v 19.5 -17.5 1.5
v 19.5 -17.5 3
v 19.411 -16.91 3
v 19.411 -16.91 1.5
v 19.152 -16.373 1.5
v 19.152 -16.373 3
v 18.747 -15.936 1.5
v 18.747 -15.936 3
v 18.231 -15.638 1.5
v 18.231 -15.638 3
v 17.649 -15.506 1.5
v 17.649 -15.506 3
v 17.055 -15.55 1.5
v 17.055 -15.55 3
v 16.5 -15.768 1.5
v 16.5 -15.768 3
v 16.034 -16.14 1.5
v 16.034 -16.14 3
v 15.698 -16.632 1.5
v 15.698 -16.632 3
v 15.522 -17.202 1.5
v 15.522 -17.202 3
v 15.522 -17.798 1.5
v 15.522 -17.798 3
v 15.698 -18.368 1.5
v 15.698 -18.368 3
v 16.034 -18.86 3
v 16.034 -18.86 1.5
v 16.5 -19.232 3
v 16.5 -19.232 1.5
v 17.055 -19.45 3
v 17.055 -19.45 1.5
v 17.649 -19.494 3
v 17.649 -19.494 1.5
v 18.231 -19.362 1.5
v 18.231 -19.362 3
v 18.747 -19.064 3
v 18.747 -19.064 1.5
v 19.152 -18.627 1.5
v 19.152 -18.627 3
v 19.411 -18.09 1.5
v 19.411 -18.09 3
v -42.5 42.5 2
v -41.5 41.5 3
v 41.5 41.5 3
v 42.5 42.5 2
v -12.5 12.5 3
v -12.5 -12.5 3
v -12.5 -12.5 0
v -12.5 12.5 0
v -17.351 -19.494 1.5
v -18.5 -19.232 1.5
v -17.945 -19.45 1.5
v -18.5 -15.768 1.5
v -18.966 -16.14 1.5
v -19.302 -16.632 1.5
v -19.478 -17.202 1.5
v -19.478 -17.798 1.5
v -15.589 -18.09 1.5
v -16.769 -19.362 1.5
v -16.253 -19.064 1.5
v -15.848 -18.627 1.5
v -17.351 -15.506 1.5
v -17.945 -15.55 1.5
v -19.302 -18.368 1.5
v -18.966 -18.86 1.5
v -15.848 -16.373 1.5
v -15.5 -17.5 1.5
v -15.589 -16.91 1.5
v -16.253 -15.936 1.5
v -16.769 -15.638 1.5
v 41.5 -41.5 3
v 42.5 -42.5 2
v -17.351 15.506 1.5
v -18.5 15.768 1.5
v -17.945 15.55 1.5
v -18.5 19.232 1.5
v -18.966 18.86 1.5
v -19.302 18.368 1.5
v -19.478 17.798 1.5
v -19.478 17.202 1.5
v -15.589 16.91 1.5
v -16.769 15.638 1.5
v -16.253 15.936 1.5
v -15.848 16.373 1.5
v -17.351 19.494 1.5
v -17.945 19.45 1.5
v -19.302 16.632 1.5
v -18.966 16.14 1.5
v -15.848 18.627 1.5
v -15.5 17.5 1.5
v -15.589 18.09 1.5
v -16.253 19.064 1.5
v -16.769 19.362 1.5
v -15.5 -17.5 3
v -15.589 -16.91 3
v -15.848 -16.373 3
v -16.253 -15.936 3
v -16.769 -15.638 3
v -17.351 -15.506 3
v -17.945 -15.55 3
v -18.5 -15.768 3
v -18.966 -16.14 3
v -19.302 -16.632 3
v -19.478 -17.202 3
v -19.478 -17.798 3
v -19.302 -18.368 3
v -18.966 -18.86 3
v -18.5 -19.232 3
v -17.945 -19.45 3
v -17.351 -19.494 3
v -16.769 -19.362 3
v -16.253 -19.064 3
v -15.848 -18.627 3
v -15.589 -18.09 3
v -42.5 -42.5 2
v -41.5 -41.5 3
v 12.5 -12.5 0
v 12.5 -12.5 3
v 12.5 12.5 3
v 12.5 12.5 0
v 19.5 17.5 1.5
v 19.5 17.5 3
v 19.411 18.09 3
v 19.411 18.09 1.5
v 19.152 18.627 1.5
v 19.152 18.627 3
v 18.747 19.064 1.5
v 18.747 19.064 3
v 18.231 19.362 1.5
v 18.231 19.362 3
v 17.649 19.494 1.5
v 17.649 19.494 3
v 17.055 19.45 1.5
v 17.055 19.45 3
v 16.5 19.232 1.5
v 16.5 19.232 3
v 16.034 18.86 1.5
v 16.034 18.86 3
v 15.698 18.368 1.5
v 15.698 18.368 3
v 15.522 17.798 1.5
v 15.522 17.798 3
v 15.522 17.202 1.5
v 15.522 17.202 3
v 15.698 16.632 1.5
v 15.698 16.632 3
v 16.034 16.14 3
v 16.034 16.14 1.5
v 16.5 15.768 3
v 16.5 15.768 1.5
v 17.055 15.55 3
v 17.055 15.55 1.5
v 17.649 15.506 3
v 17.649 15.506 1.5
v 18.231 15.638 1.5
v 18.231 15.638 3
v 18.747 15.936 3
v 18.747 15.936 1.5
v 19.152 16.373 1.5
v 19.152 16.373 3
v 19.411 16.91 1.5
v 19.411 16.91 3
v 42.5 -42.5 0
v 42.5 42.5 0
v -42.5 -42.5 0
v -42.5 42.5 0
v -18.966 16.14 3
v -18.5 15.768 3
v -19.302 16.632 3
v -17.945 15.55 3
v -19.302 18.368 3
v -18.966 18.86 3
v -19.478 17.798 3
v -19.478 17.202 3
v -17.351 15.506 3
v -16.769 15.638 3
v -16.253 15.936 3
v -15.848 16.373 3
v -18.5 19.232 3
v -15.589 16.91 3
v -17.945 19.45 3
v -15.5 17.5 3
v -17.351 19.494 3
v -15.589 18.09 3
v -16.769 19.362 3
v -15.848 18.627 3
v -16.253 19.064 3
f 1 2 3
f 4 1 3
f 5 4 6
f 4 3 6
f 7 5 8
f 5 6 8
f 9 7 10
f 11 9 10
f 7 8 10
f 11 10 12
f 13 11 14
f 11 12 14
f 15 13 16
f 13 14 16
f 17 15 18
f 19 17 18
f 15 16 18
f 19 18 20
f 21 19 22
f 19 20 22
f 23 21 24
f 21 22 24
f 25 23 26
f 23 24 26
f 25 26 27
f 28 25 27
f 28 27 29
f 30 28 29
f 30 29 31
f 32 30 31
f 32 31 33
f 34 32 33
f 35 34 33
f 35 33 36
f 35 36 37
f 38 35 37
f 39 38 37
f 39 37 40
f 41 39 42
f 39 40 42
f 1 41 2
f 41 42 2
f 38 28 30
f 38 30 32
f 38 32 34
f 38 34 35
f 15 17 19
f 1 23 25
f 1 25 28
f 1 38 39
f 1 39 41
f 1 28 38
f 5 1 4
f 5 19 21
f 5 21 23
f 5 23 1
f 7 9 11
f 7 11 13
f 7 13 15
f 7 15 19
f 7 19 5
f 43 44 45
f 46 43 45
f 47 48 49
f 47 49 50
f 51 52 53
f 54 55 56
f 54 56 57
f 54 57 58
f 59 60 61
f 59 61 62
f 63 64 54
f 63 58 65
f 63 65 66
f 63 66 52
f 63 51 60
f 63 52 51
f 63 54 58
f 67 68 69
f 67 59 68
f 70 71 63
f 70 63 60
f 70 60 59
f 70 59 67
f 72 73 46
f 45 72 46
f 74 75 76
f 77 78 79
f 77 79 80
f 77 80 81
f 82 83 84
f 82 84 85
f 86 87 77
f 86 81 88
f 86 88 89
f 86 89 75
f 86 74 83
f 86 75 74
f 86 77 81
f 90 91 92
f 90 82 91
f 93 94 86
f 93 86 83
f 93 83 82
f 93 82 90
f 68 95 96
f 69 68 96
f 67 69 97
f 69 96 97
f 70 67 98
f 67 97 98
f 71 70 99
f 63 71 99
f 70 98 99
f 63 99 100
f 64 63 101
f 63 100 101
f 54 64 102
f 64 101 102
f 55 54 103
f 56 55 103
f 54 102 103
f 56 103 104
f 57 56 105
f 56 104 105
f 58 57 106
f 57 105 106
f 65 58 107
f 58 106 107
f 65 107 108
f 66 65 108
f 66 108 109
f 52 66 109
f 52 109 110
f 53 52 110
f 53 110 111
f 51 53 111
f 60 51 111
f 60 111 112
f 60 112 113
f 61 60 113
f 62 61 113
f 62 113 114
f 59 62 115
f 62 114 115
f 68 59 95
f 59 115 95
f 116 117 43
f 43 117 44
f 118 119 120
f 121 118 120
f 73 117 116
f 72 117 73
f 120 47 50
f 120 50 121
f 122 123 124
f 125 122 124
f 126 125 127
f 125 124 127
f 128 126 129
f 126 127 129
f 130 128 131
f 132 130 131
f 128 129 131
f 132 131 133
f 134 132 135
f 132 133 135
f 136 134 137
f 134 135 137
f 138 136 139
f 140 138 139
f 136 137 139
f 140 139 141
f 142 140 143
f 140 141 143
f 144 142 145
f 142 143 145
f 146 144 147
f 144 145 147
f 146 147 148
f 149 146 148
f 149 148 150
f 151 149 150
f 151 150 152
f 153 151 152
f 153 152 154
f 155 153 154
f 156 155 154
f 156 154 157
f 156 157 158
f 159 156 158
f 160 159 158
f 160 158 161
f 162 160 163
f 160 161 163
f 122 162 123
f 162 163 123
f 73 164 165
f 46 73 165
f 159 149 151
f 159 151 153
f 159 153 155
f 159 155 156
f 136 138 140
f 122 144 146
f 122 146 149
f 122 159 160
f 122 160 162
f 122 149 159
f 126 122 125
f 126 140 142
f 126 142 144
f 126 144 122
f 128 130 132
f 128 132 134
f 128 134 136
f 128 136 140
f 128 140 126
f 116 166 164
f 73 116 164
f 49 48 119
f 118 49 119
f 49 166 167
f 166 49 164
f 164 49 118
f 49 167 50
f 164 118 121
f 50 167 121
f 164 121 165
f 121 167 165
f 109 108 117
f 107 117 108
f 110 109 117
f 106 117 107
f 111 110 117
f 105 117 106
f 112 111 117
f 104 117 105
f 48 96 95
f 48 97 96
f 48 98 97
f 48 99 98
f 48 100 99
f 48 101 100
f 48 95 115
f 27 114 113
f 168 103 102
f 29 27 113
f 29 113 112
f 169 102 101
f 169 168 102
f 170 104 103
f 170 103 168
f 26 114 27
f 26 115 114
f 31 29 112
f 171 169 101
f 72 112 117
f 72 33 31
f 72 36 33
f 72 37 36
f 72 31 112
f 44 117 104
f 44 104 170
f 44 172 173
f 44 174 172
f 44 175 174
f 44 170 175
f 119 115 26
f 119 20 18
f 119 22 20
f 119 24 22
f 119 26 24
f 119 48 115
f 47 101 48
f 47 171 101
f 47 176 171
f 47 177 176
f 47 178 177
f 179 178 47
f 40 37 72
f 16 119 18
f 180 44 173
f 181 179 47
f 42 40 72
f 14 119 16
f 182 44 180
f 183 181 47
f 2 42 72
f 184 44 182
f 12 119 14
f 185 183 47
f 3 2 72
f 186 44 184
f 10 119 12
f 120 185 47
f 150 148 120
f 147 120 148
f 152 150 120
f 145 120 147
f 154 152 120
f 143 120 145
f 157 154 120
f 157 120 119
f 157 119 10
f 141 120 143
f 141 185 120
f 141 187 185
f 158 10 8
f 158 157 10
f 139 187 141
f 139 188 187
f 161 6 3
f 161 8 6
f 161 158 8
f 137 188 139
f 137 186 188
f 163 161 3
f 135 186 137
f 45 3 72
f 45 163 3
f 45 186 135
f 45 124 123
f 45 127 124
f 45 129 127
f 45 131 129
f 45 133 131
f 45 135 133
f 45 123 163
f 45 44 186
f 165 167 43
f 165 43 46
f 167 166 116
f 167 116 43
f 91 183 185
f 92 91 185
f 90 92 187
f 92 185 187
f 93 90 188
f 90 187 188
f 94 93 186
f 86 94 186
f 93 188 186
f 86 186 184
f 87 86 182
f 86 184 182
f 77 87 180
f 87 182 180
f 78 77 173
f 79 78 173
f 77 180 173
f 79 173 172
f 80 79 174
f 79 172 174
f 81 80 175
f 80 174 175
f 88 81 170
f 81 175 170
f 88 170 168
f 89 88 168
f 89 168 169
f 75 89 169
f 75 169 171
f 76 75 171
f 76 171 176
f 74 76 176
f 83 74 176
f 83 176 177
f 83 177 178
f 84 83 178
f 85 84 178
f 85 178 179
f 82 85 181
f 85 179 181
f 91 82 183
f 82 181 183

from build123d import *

# Parameters (mm, degrees)
SKETCH_W        = 85
SKETCH_H        = 85
PAD_DEPTH       = 3
SKETCH001_W     = 25
SKETCH001_H     = 25
POCKET_DEPTH    = 5
CHAMFER_SIZE    = 1
SKETCH002_R     = 2
POCKET001_DEPTH = 1.5


with BuildPart() as part:
    # Sketch → Pad (new body)
    with BuildSketch(Plane.XY):
        Rectangle(SKETCH_W, SKETCH_H)
    extrude(amount=PAD_DEPTH)

    # Sketch001 (on Face6 of Pad) → Pocket (cut)
    with BuildSketch(Plane.XY.offset(3)):
        Rectangle(SKETCH001_W, SKETCH001_H)
    extrude(amount=-POCKET_DEPTH, mode=Mode.SUBTRACT)

    # Chamfer
    chamfer_edges = [part.edges().sort_by_distance(p)[0] for p in [
        (42.5, 0, 3),
        (0, -42.5, 3),
        (-42.5, 0, 3),
        (0, 42.5, 3),
    ]]
    chamfer(chamfer_edges, length=CHAMFER_SIZE)

    # Sketch002 (on Face8 of Chamfer) → Pocket001 (cut)
    with BuildSketch(Plane.XY.offset(3)):
        with Locations((-17.5, 17.5)):
            Circle(SKETCH002_R)
        with Locations((-17.5, -17.5)):
            Circle(SKETCH002_R)
        with Locations((17.5, -17.5)):
            Circle(SKETCH002_R)
        with Locations((17.5, 17.5)):
            Circle(SKETCH002_R)
    extrude(amount=-POCKET001_DEPTH, mode=Mode.SUBTRACT)


solid = part.part
